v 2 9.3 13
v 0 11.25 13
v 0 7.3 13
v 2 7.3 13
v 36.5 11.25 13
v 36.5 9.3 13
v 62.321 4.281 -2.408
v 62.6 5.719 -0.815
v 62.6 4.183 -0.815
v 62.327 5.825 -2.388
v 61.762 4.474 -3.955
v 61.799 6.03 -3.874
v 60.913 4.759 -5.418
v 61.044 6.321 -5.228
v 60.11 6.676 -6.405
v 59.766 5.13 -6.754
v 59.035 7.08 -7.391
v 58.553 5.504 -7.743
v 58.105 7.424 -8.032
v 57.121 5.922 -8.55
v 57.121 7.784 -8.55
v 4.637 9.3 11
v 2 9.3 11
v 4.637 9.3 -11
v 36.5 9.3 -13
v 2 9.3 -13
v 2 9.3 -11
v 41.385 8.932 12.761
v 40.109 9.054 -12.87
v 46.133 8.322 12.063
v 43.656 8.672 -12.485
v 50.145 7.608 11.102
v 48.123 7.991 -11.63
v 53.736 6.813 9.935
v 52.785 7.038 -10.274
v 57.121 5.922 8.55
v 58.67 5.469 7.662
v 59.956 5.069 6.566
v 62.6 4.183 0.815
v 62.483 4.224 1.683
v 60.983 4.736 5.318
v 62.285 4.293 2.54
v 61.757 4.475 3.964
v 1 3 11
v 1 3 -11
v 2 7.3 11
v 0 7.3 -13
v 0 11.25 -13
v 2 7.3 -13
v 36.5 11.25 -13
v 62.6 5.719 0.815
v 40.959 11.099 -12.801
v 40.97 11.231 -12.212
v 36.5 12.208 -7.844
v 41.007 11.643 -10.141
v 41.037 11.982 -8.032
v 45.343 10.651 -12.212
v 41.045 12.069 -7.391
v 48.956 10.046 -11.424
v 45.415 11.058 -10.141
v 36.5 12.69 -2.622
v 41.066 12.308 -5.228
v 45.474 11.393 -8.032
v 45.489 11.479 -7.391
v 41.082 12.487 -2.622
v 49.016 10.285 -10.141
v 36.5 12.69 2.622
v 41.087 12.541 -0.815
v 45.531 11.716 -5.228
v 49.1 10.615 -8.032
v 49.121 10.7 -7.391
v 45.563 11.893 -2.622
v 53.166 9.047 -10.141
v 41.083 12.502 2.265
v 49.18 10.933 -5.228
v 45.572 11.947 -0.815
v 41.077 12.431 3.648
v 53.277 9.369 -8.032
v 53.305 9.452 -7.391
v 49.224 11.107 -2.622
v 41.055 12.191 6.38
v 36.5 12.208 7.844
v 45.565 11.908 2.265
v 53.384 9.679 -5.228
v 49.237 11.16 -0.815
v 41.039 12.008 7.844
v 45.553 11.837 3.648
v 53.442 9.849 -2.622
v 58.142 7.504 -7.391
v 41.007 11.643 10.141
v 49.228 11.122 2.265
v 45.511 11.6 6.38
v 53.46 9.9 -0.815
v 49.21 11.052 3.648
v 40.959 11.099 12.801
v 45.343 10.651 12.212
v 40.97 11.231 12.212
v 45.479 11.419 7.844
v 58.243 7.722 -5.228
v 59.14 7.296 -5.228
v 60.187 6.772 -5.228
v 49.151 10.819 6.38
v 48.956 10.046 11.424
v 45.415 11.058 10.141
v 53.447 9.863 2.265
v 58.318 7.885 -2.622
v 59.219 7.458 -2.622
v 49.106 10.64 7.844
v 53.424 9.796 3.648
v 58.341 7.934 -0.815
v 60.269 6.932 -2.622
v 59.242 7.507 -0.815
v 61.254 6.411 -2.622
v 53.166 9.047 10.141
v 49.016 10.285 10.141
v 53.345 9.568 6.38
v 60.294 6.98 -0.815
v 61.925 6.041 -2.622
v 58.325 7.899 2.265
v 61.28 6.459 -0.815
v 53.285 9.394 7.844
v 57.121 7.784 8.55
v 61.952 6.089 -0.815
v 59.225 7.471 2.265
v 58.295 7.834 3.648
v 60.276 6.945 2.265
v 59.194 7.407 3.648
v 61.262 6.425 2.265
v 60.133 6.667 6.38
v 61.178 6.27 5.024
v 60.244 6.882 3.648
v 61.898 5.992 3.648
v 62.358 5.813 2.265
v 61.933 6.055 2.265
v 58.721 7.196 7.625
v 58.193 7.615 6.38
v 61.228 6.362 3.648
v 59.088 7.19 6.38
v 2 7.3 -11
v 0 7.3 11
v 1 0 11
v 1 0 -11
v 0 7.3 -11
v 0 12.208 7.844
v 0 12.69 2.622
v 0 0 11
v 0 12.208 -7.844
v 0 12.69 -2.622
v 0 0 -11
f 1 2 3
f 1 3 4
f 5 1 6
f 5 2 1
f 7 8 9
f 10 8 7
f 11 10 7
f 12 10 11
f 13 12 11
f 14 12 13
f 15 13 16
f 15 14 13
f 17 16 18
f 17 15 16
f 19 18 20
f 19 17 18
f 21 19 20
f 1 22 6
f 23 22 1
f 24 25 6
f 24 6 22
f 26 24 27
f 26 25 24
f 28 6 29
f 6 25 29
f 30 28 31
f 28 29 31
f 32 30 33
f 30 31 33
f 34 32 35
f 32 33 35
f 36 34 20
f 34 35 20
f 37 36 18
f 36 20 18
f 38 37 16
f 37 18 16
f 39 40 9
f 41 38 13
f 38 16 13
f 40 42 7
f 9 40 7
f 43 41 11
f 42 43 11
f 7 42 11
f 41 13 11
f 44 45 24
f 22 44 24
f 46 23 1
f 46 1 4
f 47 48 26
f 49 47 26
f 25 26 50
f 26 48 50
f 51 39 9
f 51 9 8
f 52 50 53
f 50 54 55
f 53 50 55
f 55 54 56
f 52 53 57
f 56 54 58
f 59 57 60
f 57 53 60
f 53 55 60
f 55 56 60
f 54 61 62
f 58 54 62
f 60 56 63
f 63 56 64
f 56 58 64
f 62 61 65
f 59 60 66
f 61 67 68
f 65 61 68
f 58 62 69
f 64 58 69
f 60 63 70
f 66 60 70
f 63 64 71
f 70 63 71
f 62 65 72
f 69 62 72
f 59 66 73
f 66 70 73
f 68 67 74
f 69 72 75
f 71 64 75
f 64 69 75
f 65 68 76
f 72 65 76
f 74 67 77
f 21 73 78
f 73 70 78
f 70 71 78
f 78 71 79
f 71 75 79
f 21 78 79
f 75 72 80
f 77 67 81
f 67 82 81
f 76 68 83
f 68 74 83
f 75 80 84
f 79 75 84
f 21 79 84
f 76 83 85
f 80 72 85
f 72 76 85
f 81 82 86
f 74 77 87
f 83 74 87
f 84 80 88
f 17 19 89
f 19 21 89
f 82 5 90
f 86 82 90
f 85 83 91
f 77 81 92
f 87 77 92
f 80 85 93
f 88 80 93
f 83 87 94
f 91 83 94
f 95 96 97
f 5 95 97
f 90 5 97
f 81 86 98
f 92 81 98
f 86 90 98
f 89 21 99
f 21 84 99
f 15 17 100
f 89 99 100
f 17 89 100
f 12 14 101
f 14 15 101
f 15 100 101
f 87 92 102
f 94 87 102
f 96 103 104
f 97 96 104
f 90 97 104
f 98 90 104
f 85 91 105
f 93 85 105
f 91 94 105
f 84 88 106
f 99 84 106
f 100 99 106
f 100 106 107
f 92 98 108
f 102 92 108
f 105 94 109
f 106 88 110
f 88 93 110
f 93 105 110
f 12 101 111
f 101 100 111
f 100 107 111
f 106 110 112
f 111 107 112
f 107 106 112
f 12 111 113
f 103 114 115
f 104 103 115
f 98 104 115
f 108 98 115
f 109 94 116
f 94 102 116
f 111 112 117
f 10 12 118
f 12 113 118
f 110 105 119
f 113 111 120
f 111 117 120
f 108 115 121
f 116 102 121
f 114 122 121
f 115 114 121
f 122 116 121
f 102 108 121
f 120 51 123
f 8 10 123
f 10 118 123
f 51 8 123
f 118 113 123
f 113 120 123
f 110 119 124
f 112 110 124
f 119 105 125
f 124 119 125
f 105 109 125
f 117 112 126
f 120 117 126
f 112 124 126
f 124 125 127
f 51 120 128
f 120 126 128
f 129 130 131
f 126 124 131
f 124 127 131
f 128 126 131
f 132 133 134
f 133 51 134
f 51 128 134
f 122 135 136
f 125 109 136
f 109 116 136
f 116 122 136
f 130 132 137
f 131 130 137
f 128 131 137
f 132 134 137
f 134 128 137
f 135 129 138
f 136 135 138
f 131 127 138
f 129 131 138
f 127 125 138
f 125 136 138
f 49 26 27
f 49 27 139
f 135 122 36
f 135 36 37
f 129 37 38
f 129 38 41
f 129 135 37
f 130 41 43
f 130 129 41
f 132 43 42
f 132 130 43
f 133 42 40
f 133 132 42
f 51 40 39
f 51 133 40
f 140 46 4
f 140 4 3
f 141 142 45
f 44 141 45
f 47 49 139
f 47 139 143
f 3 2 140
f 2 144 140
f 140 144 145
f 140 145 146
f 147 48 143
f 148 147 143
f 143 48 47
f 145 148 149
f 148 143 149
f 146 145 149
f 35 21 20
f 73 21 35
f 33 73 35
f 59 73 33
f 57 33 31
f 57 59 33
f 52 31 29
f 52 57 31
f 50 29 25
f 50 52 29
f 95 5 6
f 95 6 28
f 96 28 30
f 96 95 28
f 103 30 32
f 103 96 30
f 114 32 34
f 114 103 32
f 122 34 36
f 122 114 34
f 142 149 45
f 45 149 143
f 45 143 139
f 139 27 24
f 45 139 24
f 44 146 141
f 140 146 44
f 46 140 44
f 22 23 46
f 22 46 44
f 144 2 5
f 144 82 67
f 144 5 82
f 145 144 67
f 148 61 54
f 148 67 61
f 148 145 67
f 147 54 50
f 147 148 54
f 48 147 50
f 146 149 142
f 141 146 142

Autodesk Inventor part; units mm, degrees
sketch "Sketch_26" plane through (0, 0, 0) normal (0, 0, 1) x (1, 0, 0)
  line L0 (0, 15) -> (0, 0)
  line L1 (0, 0) -> (62.6, 0)
  line L2 (62.6, 0) -> (62.6, 15)
  line L3 (62.6, 15) -> (0, 15)
extrude "Extrusion1" add sketch "Sketch_26" along normal mid plane 26
sketch "Sketch_1" plane through (0, 0, 0) normal (1, 0, 0) x (0, 0, -1)
  arc A0 (13, 11.25) -> (-13, 11.25) centre (0, -44.3333) ccw
  line L0 (13, 11.25) -> (13, 20.75)
  line L1 (13, 20.75) -> (-13, 20.75)
  line L2 (-13, 20.75) -> (-13, 11.25)
extrude "Extrusion2" cut sketch "Sketch_1" along normal blind 36.5
sketch "Sketch_12" plane through (0, 13.8, 0) normal (0, 1, 0) x (1, 0, 0)
  line L0 (-1, 16) -> (-1, -14)
  line L1 (-1, -14) -> (64, -14)
  line L2 (64, -14) -> (64, 16)
  line L3 (64, 16) -> (-1, 16)
  line L4 (0, 13) -> (0, -13)
  line L5 (0, -13) -> (36.5, -13)
  arc A0 (36.5, -13) -> (57.121, -8.5497) centre (36.5, 37) ccw
  arc A1 (57.121, -8.5497) -> (57.121, 8.5497) centre (53.2505, 0) ccw
  arc A2 (57.121, 8.5497) -> (36.5, 13) centre (36.5, -37) ccw
  line L6 (36.5, 13) -> (0, 13)
extrude "Extrusion3" cut sketch "Sketch_12" against normal blind 15
sketch "Sketch_3" plane through (36.5, 0, 0) normal (1, 0, 0) x (0, 0, -1)
  line L0 (13, -39.25) -> (-13, -39.25)
  arc A0 (13, 11.25) -> (-13, 11.25) centre (0, -44.3333) ccw
  line L1 (13, 11.25) -> (13, 25.75)
  line L2 (13, 25.75) -> (-13, 25.75)
  line L3 (-13, 25.75) -> (-13, 11.25)
revolve "Revolution1" cut sketch "Sketch_3" angle 35 about axis through (36.5, -39.25, -13) along (0, 0, -1)
sketch "Sketch_2" plane through (0, 0, 0) normal (0, 0, 1) x (1, 0, 0)
  line L0 (0, 7.3) -> (0, -51.7)
  line L1 (0, -51.7) -> (65, -51.7)
  line L2 (65, -51.7) -> (65, 3.3)
  arc A0 (65, 3.3) -> (36.5, 9.3) centre (32.036, -82.5916) ccw
  line L3 (36.5, 9.3) -> (2, 9.3)
  line L4 (2, 9.3) -> (2, 7.3)
  line L5 (2, 7.3) -> (0, 7.3)
extrude "Extrusion4" cut sketch "Sketch_2" along normal mid plane 26
sketch "Sketch_24" plane through (0, 0, 0) normal (0, 0, 1) x (1, 0, 0)
  line L0 (0, 10.75) -> (0, 0)
  line L1 (0, 0) -> (1, 0)
  line L2 (1, 0) -> (1, 3)
  line L3 (1, 3) -> (5.4745, 10.75)
  line L4 (5.4745, 10.75) -> (0, 10.75)
extrude "Extrusion5" add sketch "Sketch_24" along normal mid plane 22
ref_plane "AK_XY" through (0, -0.05, 0) normal (-1, 0, 0) x (0, 0, -1)
ref_plane "AK_YZ" through (0, -0.05, 0) normal (0, 0, -1) x (0, -1, 0)
ref_plane "AK_ZX" through (0, -0.05, 0) normal (0, -1, 0) x (-1, 0, 0)
properties part number "EGC-80-TB-KF_(AK)"
